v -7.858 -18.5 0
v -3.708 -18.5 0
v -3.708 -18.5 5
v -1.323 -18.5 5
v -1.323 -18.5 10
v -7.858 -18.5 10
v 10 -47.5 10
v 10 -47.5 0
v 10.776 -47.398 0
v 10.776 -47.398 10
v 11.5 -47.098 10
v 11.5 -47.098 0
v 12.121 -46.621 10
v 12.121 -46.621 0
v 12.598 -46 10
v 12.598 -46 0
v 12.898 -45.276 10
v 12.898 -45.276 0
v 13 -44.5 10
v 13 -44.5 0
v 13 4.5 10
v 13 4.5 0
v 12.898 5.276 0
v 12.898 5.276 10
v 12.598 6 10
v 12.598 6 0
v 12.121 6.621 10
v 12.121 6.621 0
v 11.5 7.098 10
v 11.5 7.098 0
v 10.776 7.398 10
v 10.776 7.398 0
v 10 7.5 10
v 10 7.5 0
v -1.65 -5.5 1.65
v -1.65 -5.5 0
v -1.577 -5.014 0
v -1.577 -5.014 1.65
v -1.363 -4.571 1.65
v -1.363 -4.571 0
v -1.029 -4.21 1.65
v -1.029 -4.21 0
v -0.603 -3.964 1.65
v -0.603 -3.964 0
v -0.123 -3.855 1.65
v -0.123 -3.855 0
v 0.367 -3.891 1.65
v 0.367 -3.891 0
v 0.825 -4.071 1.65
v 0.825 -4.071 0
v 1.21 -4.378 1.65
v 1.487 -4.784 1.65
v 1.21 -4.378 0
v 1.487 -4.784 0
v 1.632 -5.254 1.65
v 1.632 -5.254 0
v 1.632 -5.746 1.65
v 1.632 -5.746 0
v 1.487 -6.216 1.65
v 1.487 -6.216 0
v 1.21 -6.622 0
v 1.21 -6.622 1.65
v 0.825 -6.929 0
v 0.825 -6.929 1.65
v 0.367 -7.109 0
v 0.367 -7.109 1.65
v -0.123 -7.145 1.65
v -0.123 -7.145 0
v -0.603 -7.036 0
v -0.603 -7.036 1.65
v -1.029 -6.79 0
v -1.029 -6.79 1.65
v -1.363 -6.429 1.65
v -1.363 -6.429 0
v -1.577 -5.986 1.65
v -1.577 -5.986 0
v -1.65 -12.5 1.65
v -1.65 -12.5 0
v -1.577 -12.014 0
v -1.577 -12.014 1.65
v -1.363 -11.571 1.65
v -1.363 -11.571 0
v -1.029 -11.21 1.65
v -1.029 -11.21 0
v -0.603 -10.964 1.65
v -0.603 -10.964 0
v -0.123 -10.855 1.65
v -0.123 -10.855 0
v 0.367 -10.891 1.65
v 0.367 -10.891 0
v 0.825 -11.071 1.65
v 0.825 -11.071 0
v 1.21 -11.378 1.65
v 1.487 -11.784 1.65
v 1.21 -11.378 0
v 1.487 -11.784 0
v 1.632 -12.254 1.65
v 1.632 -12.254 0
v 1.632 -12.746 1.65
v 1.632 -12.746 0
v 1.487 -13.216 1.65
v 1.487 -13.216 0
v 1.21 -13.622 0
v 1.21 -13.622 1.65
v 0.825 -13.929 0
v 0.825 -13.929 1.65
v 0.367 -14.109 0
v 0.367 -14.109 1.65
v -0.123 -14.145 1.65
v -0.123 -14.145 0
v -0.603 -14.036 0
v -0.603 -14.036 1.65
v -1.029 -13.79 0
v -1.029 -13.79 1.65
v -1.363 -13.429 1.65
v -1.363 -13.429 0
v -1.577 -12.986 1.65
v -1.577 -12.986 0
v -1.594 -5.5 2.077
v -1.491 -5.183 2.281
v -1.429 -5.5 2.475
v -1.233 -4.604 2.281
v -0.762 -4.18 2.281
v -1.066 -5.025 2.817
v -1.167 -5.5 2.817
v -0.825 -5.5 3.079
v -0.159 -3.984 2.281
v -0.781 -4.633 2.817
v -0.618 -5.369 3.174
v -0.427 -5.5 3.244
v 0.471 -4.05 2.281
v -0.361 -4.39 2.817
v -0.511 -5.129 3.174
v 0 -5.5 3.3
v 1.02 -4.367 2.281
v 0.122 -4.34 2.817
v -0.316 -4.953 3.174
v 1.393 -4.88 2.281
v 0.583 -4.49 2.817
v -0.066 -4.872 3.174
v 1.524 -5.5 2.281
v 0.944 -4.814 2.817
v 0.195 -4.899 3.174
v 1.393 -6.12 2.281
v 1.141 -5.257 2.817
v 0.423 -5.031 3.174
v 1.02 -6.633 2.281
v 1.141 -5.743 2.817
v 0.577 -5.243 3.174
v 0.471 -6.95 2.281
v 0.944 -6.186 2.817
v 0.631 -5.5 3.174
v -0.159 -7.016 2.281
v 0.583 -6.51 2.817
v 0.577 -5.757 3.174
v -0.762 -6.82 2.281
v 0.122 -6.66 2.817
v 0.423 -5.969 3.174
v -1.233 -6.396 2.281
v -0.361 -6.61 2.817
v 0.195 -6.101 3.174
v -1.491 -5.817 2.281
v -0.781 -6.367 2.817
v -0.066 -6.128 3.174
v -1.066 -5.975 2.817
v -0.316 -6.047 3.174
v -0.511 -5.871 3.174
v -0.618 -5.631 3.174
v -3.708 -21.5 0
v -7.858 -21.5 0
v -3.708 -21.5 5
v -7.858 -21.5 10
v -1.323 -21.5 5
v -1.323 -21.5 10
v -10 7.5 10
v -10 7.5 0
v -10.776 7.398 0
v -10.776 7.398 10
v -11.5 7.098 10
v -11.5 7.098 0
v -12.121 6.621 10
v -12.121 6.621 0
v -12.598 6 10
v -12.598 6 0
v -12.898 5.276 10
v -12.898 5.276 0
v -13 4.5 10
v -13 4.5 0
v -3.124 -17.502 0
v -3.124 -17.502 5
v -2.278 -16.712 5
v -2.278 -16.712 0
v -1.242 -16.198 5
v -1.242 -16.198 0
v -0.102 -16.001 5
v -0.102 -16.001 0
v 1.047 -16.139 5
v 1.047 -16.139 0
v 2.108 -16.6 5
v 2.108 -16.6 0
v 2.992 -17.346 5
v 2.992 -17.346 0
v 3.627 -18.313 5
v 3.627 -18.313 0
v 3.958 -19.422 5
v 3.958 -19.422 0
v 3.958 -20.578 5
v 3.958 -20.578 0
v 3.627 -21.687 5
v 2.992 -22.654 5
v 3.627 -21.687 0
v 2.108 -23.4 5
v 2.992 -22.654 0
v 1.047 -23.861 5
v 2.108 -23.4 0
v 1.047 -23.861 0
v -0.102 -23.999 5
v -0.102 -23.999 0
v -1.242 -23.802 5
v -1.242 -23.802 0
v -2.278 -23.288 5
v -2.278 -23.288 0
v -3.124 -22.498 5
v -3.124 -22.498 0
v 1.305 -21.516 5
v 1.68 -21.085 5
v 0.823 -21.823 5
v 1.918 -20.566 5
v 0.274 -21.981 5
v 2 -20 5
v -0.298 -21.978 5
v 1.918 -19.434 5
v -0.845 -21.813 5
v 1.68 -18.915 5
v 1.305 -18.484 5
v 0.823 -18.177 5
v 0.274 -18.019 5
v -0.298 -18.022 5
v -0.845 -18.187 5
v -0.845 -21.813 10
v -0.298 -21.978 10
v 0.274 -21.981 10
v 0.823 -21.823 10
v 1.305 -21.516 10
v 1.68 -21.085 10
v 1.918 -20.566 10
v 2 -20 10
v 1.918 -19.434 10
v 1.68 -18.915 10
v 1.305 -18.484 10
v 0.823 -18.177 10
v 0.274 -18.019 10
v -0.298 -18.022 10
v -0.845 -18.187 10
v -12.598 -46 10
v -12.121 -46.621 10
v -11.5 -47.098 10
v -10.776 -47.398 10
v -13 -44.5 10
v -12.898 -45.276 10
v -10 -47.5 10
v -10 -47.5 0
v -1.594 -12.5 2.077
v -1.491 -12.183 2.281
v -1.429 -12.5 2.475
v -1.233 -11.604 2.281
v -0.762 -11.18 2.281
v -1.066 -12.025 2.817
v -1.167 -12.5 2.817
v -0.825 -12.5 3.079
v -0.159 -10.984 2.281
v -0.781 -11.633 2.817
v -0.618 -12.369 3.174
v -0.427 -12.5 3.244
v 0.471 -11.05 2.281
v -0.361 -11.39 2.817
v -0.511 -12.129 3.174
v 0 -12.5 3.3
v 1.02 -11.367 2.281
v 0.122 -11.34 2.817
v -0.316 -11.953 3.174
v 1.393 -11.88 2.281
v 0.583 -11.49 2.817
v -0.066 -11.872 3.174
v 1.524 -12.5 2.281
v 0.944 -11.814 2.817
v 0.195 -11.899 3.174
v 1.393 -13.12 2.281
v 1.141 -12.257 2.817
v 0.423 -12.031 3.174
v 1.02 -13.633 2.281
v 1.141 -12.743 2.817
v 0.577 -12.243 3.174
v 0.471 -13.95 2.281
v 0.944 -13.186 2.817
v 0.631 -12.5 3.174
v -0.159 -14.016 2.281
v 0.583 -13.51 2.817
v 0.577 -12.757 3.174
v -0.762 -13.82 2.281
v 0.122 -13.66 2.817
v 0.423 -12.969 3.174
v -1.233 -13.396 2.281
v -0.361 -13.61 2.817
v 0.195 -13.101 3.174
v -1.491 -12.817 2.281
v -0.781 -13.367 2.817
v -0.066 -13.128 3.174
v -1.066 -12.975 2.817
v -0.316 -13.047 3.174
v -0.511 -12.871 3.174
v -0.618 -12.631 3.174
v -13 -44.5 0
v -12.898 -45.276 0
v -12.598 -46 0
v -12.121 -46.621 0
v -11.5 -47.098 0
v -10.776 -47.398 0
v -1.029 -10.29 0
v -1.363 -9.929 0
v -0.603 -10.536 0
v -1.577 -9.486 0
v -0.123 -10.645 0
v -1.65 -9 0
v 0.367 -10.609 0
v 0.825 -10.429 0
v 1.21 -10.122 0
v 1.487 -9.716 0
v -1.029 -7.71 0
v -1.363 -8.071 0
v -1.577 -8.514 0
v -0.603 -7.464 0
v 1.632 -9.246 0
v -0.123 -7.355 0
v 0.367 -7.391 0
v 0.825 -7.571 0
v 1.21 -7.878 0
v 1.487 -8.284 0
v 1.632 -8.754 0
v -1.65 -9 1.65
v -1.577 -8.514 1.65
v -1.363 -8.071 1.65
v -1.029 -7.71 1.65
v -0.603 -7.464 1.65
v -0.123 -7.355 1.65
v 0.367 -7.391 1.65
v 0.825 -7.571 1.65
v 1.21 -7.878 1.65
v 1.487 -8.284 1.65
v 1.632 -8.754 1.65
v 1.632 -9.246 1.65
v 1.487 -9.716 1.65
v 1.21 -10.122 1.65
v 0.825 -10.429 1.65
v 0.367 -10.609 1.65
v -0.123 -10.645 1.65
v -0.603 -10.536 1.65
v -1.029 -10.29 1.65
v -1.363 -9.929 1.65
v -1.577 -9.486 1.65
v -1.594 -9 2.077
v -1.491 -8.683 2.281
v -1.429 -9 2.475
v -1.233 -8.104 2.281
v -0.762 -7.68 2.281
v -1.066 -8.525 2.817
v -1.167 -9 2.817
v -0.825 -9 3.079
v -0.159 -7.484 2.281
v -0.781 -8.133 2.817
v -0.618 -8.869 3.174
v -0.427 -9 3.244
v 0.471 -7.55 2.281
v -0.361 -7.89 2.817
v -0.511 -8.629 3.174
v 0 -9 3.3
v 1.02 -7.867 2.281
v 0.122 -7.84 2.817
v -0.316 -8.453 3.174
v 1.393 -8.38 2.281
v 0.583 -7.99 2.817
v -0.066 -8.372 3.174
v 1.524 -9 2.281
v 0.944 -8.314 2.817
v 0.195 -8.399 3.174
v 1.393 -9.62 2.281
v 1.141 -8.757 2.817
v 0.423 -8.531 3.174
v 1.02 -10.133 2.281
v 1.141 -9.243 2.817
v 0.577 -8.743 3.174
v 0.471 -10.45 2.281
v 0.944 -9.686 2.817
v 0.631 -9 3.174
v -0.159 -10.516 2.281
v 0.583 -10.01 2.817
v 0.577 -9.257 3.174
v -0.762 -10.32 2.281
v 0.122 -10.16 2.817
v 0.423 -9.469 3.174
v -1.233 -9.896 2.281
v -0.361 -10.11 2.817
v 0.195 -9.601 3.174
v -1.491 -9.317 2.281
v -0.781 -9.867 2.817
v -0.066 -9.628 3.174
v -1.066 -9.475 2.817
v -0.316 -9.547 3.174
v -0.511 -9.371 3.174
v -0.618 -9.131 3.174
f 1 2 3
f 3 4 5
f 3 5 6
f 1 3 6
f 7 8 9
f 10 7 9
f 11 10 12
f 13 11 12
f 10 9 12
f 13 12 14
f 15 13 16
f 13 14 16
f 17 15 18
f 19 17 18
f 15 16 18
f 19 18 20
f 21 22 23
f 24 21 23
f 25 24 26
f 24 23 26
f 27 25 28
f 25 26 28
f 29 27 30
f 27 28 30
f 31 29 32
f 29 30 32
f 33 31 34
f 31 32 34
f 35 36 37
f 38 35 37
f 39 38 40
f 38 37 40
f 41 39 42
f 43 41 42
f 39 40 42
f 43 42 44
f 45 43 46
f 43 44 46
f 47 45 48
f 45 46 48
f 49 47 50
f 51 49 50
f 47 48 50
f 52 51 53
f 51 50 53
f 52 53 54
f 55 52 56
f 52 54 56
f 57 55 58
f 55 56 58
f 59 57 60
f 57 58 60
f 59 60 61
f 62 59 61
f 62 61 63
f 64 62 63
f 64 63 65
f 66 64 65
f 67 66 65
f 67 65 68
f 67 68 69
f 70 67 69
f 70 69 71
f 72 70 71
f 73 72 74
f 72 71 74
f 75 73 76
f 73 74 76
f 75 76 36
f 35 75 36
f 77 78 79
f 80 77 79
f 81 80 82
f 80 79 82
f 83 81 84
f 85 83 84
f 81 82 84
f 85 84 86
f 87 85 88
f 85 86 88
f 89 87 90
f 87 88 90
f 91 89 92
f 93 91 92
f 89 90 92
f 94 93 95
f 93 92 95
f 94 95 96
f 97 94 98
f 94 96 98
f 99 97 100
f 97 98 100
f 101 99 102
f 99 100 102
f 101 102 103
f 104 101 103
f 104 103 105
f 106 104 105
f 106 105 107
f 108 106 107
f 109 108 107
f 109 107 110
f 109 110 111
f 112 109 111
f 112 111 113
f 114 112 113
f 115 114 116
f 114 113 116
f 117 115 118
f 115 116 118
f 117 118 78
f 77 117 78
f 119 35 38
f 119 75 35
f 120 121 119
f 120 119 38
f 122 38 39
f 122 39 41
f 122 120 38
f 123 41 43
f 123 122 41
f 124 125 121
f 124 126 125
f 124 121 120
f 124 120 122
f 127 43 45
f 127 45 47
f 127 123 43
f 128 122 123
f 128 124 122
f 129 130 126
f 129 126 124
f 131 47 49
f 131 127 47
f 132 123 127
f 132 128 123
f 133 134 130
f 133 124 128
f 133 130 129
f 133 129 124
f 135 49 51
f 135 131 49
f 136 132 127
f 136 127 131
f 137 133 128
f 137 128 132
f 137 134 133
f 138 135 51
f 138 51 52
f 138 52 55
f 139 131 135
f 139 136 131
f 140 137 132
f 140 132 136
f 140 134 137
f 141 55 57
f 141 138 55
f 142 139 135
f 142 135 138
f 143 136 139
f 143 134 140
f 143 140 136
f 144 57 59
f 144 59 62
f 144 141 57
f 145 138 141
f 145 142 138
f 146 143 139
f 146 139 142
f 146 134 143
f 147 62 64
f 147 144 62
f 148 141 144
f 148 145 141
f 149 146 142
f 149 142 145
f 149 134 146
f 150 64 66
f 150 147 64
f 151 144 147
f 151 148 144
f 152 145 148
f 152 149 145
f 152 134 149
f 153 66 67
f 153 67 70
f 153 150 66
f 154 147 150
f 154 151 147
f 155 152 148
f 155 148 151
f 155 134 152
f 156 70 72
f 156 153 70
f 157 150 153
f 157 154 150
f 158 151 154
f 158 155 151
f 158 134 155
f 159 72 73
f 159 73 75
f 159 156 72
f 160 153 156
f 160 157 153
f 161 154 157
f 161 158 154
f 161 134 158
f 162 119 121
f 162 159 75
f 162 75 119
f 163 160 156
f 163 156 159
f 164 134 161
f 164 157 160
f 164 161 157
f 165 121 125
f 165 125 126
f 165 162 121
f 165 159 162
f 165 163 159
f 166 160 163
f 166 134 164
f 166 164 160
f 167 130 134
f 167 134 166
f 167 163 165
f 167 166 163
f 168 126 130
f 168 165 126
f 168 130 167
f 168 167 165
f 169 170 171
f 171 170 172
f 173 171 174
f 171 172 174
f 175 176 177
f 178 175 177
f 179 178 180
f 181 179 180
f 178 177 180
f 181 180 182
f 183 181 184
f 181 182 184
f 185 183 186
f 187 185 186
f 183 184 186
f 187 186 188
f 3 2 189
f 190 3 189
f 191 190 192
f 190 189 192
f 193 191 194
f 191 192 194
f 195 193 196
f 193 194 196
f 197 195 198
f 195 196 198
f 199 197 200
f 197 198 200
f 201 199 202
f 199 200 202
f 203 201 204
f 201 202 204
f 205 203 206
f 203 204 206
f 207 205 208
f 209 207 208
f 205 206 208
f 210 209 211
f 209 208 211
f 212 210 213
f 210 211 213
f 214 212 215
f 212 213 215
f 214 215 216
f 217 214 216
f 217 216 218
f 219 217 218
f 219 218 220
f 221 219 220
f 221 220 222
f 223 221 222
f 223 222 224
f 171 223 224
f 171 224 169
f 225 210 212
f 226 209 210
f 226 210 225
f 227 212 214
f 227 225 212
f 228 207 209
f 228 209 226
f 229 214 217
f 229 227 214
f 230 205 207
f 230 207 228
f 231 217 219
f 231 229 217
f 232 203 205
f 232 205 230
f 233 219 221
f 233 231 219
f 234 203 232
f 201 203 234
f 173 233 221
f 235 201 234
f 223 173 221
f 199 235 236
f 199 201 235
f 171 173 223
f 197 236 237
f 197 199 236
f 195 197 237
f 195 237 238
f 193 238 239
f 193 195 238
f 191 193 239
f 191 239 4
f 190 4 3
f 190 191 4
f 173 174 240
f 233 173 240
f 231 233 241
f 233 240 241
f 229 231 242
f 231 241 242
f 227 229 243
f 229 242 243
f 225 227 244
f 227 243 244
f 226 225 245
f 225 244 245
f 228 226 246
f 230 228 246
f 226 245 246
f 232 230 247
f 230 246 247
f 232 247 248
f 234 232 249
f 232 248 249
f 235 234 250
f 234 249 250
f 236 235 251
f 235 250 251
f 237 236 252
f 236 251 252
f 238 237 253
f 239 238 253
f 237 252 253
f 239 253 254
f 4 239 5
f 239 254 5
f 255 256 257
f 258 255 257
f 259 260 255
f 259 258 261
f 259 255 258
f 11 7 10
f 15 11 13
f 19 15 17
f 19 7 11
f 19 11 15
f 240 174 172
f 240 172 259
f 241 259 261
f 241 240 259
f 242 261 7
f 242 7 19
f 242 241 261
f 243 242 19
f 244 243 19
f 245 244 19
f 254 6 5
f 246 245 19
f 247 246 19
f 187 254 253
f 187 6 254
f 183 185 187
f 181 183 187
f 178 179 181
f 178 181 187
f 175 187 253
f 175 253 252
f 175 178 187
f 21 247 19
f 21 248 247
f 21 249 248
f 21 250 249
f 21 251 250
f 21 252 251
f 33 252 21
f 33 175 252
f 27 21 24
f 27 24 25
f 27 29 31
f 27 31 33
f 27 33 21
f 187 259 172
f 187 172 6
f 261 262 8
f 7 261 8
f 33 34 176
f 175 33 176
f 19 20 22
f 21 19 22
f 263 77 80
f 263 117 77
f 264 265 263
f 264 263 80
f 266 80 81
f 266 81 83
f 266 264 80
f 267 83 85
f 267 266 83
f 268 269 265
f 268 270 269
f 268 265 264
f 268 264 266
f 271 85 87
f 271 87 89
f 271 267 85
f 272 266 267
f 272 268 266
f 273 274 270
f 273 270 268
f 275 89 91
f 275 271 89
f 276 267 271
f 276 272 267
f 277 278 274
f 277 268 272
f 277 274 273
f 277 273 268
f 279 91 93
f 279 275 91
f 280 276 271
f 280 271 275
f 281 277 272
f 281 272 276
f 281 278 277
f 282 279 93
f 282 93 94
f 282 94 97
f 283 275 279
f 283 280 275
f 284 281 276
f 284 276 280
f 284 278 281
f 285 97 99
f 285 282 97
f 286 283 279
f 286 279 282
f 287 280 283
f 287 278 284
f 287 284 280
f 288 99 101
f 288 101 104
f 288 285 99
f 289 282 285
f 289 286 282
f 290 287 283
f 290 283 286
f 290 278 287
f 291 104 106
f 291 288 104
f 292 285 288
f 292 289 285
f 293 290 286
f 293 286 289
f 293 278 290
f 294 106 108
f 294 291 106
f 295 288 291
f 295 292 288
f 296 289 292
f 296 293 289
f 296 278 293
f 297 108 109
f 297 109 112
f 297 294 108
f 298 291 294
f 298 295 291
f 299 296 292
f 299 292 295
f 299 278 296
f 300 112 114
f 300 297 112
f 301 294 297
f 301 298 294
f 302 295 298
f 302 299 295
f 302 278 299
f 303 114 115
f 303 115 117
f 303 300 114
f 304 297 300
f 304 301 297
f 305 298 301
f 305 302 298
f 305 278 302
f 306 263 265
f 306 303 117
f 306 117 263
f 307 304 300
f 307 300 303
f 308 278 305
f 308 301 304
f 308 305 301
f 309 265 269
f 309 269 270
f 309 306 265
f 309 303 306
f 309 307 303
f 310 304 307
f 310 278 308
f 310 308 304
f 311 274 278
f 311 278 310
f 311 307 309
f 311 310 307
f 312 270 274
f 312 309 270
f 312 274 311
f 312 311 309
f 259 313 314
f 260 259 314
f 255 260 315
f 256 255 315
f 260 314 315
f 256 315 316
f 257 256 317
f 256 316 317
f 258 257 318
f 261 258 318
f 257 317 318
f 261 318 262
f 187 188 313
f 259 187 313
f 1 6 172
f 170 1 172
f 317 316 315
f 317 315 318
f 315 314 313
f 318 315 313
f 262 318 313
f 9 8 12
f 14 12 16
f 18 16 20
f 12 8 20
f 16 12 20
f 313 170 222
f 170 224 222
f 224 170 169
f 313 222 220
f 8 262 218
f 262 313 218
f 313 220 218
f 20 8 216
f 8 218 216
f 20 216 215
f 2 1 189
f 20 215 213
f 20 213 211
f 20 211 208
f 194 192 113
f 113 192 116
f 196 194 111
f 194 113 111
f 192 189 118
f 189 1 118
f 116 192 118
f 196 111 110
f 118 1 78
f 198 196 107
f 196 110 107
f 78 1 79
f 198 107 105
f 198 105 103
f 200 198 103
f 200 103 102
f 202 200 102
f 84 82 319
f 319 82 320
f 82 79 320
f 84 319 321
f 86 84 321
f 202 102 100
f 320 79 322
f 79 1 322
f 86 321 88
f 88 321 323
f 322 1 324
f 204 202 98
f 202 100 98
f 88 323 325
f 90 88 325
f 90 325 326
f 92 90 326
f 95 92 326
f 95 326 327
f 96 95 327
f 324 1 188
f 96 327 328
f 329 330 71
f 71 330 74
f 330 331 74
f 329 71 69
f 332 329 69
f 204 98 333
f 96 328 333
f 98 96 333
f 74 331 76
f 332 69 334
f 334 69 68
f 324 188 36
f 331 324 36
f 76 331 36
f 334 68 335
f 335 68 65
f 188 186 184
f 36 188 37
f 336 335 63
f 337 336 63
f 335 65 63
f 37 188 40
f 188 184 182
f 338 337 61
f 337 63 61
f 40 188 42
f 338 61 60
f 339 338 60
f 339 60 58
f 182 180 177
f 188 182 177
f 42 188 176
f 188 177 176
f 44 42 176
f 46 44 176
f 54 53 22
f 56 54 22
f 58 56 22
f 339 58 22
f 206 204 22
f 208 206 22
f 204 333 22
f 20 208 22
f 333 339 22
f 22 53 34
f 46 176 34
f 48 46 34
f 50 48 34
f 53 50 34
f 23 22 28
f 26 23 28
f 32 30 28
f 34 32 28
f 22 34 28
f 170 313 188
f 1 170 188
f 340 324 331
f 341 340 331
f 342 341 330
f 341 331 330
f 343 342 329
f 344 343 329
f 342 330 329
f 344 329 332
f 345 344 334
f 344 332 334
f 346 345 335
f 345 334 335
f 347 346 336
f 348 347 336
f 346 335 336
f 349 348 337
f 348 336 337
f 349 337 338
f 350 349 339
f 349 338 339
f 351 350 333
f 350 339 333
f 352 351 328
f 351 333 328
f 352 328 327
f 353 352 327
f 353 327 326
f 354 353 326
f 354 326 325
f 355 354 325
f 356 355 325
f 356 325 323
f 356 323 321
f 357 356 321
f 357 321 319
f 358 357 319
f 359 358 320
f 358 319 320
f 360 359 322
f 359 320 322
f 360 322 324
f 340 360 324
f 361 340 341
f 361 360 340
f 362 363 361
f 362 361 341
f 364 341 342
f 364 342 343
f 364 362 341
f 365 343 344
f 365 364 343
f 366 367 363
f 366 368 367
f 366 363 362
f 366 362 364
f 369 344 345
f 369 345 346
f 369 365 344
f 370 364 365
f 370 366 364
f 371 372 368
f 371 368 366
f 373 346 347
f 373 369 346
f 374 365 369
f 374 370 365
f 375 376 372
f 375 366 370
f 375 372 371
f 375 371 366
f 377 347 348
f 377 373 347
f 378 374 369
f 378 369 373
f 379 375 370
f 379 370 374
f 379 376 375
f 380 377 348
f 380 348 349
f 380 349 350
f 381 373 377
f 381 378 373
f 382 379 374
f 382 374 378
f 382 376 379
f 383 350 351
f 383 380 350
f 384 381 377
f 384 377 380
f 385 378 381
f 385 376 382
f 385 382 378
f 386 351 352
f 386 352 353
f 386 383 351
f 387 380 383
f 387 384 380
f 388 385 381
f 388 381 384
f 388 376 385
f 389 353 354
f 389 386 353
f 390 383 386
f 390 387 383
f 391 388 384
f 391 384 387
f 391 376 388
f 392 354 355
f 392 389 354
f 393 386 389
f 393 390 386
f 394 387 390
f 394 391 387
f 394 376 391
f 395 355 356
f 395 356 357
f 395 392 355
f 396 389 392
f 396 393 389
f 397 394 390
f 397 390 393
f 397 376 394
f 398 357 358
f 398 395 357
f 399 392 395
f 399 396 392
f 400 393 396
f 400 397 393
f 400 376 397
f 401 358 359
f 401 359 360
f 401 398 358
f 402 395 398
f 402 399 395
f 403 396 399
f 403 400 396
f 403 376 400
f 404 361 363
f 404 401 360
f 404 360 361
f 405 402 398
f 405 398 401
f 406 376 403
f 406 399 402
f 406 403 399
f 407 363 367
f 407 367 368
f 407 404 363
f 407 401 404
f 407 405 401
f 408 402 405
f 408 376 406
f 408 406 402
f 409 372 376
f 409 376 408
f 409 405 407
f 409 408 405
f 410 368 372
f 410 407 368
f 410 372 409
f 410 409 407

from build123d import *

# Parameters (mm, degrees)
BOSS_EXTRUDE1_DEPTH = 10
SKETCH5_R           = 4
CUT_EXTRUDE3_DEPTH  = 5
CUT_EXTRUDE1_REACH  = 52.252
SKETCH3_R           = 1.65
CUT_EXTRUDE2_DEPTH  = 3.3
FILLET1_R           = 1.65


with BuildPart() as part:
    # Sketch1 → Boss-Extrude1 (new body)
    with BuildSketch(Plane.XY):
        with BuildLine():
            Line((-10, -47.5), (10, -47.5))
            ThreePointArc((10, -47.5), (12.121320344, -46.621320344), (13, -44.5))
            Line((13, -44.5), (13, 4.5))
            ThreePointArc((13, 4.5), (12.121320344, 6.621320344), (10, 7.5))
            Line((10, 7.5), (-10, 7.5))
            ThreePointArc((-10, 7.5), (-12.121320344, 6.621320344), (-13, 4.5))
            Line((-13, 4.5), (-13, -44.5))
            ThreePointArc((-13, -44.5), (-12.121320344, -46.621320344), (-10, -47.5))
        make_face()
    extrude(amount=BOSS_EXTRUDE1_DEPTH)

    # Sketch5 → Cut-Extrude3 (cut)
    with BuildSketch(Plane(origin=(0, 0, 0), x_dir=(-1, 0, 0), z_dir=(0, 0, -1))):
        with Locations((0, -20)):
            Circle(SKETCH5_R)
    extrude(amount=-CUT_EXTRUDE3_DEPTH, mode=Mode.SUBTRACT)

    # Cut-Extrude1: up to this face of the body (flat: up to its plane)
    cut_extrude1_end = Plane(part.part.faces().sort_by_distance((-11.69114596, -46.19114596, 0))[0])
    # Sketch2 → Cut-Extrude1 (cut, up to the picked face)
    with BuildSketch(Plane.XY.offset(10), mode=Mode.PRIVATE) as cut_extrude1_sk1:
        with BuildLine():
            Line((-1.322875656, -18.5), (-7.858116823, -18.5))
            Line((-7.858116823, -18.5), (-7.858116823, -21.5))
            Line((-7.858116823, -21.5), (-1.322875656, -21.5))
            ThreePointArc((-1.322875656, -21.5), (2, -20), (-1.322875656, -18.5))
        make_face()
    cut_extrude1_tool1 = split(extrude(cut_extrude1_sk1.sketch, amount=-CUT_EXTRUDE1_REACH, mode=Mode.PRIVATE), bisect_by=cut_extrude1_end, keep=Keep.BOTH, mode=Mode.PRIVATE)
    add(cut_extrude1_tool1.solids().sort_by(Axis((-2.852345, -20, 10), (0, 0, -1)))[0], mode=Mode.SUBTRACT)

    # Sketch3 → Cut-Extrude2 (cut)
    with BuildSketch(Plane(origin=(0, 0, 0), x_dir=(-1, 0, 0), z_dir=(0, 0, -1))):
        with Locations((0, -5.5)):
            Circle(SKETCH3_R)
        with Locations((0, -9)):
            Circle(SKETCH3_R)
        with Locations((0, -12.5)):
            Circle(SKETCH3_R)
    extrude(amount=-CUT_EXTRUDE2_DEPTH, mode=Mode.SUBTRACT)

    # Fillet1
    fillet1_edges = [part.edges().sort_by_distance(p)[0] for p in [
        (1.65, -5.5, 3.3),
        (1.65, -9, 3.3),
        (1.65, -12.5, 3.3),
    ]]
    fillet(fillet1_edges, radius=FILLET1_R)


solid = part.part
